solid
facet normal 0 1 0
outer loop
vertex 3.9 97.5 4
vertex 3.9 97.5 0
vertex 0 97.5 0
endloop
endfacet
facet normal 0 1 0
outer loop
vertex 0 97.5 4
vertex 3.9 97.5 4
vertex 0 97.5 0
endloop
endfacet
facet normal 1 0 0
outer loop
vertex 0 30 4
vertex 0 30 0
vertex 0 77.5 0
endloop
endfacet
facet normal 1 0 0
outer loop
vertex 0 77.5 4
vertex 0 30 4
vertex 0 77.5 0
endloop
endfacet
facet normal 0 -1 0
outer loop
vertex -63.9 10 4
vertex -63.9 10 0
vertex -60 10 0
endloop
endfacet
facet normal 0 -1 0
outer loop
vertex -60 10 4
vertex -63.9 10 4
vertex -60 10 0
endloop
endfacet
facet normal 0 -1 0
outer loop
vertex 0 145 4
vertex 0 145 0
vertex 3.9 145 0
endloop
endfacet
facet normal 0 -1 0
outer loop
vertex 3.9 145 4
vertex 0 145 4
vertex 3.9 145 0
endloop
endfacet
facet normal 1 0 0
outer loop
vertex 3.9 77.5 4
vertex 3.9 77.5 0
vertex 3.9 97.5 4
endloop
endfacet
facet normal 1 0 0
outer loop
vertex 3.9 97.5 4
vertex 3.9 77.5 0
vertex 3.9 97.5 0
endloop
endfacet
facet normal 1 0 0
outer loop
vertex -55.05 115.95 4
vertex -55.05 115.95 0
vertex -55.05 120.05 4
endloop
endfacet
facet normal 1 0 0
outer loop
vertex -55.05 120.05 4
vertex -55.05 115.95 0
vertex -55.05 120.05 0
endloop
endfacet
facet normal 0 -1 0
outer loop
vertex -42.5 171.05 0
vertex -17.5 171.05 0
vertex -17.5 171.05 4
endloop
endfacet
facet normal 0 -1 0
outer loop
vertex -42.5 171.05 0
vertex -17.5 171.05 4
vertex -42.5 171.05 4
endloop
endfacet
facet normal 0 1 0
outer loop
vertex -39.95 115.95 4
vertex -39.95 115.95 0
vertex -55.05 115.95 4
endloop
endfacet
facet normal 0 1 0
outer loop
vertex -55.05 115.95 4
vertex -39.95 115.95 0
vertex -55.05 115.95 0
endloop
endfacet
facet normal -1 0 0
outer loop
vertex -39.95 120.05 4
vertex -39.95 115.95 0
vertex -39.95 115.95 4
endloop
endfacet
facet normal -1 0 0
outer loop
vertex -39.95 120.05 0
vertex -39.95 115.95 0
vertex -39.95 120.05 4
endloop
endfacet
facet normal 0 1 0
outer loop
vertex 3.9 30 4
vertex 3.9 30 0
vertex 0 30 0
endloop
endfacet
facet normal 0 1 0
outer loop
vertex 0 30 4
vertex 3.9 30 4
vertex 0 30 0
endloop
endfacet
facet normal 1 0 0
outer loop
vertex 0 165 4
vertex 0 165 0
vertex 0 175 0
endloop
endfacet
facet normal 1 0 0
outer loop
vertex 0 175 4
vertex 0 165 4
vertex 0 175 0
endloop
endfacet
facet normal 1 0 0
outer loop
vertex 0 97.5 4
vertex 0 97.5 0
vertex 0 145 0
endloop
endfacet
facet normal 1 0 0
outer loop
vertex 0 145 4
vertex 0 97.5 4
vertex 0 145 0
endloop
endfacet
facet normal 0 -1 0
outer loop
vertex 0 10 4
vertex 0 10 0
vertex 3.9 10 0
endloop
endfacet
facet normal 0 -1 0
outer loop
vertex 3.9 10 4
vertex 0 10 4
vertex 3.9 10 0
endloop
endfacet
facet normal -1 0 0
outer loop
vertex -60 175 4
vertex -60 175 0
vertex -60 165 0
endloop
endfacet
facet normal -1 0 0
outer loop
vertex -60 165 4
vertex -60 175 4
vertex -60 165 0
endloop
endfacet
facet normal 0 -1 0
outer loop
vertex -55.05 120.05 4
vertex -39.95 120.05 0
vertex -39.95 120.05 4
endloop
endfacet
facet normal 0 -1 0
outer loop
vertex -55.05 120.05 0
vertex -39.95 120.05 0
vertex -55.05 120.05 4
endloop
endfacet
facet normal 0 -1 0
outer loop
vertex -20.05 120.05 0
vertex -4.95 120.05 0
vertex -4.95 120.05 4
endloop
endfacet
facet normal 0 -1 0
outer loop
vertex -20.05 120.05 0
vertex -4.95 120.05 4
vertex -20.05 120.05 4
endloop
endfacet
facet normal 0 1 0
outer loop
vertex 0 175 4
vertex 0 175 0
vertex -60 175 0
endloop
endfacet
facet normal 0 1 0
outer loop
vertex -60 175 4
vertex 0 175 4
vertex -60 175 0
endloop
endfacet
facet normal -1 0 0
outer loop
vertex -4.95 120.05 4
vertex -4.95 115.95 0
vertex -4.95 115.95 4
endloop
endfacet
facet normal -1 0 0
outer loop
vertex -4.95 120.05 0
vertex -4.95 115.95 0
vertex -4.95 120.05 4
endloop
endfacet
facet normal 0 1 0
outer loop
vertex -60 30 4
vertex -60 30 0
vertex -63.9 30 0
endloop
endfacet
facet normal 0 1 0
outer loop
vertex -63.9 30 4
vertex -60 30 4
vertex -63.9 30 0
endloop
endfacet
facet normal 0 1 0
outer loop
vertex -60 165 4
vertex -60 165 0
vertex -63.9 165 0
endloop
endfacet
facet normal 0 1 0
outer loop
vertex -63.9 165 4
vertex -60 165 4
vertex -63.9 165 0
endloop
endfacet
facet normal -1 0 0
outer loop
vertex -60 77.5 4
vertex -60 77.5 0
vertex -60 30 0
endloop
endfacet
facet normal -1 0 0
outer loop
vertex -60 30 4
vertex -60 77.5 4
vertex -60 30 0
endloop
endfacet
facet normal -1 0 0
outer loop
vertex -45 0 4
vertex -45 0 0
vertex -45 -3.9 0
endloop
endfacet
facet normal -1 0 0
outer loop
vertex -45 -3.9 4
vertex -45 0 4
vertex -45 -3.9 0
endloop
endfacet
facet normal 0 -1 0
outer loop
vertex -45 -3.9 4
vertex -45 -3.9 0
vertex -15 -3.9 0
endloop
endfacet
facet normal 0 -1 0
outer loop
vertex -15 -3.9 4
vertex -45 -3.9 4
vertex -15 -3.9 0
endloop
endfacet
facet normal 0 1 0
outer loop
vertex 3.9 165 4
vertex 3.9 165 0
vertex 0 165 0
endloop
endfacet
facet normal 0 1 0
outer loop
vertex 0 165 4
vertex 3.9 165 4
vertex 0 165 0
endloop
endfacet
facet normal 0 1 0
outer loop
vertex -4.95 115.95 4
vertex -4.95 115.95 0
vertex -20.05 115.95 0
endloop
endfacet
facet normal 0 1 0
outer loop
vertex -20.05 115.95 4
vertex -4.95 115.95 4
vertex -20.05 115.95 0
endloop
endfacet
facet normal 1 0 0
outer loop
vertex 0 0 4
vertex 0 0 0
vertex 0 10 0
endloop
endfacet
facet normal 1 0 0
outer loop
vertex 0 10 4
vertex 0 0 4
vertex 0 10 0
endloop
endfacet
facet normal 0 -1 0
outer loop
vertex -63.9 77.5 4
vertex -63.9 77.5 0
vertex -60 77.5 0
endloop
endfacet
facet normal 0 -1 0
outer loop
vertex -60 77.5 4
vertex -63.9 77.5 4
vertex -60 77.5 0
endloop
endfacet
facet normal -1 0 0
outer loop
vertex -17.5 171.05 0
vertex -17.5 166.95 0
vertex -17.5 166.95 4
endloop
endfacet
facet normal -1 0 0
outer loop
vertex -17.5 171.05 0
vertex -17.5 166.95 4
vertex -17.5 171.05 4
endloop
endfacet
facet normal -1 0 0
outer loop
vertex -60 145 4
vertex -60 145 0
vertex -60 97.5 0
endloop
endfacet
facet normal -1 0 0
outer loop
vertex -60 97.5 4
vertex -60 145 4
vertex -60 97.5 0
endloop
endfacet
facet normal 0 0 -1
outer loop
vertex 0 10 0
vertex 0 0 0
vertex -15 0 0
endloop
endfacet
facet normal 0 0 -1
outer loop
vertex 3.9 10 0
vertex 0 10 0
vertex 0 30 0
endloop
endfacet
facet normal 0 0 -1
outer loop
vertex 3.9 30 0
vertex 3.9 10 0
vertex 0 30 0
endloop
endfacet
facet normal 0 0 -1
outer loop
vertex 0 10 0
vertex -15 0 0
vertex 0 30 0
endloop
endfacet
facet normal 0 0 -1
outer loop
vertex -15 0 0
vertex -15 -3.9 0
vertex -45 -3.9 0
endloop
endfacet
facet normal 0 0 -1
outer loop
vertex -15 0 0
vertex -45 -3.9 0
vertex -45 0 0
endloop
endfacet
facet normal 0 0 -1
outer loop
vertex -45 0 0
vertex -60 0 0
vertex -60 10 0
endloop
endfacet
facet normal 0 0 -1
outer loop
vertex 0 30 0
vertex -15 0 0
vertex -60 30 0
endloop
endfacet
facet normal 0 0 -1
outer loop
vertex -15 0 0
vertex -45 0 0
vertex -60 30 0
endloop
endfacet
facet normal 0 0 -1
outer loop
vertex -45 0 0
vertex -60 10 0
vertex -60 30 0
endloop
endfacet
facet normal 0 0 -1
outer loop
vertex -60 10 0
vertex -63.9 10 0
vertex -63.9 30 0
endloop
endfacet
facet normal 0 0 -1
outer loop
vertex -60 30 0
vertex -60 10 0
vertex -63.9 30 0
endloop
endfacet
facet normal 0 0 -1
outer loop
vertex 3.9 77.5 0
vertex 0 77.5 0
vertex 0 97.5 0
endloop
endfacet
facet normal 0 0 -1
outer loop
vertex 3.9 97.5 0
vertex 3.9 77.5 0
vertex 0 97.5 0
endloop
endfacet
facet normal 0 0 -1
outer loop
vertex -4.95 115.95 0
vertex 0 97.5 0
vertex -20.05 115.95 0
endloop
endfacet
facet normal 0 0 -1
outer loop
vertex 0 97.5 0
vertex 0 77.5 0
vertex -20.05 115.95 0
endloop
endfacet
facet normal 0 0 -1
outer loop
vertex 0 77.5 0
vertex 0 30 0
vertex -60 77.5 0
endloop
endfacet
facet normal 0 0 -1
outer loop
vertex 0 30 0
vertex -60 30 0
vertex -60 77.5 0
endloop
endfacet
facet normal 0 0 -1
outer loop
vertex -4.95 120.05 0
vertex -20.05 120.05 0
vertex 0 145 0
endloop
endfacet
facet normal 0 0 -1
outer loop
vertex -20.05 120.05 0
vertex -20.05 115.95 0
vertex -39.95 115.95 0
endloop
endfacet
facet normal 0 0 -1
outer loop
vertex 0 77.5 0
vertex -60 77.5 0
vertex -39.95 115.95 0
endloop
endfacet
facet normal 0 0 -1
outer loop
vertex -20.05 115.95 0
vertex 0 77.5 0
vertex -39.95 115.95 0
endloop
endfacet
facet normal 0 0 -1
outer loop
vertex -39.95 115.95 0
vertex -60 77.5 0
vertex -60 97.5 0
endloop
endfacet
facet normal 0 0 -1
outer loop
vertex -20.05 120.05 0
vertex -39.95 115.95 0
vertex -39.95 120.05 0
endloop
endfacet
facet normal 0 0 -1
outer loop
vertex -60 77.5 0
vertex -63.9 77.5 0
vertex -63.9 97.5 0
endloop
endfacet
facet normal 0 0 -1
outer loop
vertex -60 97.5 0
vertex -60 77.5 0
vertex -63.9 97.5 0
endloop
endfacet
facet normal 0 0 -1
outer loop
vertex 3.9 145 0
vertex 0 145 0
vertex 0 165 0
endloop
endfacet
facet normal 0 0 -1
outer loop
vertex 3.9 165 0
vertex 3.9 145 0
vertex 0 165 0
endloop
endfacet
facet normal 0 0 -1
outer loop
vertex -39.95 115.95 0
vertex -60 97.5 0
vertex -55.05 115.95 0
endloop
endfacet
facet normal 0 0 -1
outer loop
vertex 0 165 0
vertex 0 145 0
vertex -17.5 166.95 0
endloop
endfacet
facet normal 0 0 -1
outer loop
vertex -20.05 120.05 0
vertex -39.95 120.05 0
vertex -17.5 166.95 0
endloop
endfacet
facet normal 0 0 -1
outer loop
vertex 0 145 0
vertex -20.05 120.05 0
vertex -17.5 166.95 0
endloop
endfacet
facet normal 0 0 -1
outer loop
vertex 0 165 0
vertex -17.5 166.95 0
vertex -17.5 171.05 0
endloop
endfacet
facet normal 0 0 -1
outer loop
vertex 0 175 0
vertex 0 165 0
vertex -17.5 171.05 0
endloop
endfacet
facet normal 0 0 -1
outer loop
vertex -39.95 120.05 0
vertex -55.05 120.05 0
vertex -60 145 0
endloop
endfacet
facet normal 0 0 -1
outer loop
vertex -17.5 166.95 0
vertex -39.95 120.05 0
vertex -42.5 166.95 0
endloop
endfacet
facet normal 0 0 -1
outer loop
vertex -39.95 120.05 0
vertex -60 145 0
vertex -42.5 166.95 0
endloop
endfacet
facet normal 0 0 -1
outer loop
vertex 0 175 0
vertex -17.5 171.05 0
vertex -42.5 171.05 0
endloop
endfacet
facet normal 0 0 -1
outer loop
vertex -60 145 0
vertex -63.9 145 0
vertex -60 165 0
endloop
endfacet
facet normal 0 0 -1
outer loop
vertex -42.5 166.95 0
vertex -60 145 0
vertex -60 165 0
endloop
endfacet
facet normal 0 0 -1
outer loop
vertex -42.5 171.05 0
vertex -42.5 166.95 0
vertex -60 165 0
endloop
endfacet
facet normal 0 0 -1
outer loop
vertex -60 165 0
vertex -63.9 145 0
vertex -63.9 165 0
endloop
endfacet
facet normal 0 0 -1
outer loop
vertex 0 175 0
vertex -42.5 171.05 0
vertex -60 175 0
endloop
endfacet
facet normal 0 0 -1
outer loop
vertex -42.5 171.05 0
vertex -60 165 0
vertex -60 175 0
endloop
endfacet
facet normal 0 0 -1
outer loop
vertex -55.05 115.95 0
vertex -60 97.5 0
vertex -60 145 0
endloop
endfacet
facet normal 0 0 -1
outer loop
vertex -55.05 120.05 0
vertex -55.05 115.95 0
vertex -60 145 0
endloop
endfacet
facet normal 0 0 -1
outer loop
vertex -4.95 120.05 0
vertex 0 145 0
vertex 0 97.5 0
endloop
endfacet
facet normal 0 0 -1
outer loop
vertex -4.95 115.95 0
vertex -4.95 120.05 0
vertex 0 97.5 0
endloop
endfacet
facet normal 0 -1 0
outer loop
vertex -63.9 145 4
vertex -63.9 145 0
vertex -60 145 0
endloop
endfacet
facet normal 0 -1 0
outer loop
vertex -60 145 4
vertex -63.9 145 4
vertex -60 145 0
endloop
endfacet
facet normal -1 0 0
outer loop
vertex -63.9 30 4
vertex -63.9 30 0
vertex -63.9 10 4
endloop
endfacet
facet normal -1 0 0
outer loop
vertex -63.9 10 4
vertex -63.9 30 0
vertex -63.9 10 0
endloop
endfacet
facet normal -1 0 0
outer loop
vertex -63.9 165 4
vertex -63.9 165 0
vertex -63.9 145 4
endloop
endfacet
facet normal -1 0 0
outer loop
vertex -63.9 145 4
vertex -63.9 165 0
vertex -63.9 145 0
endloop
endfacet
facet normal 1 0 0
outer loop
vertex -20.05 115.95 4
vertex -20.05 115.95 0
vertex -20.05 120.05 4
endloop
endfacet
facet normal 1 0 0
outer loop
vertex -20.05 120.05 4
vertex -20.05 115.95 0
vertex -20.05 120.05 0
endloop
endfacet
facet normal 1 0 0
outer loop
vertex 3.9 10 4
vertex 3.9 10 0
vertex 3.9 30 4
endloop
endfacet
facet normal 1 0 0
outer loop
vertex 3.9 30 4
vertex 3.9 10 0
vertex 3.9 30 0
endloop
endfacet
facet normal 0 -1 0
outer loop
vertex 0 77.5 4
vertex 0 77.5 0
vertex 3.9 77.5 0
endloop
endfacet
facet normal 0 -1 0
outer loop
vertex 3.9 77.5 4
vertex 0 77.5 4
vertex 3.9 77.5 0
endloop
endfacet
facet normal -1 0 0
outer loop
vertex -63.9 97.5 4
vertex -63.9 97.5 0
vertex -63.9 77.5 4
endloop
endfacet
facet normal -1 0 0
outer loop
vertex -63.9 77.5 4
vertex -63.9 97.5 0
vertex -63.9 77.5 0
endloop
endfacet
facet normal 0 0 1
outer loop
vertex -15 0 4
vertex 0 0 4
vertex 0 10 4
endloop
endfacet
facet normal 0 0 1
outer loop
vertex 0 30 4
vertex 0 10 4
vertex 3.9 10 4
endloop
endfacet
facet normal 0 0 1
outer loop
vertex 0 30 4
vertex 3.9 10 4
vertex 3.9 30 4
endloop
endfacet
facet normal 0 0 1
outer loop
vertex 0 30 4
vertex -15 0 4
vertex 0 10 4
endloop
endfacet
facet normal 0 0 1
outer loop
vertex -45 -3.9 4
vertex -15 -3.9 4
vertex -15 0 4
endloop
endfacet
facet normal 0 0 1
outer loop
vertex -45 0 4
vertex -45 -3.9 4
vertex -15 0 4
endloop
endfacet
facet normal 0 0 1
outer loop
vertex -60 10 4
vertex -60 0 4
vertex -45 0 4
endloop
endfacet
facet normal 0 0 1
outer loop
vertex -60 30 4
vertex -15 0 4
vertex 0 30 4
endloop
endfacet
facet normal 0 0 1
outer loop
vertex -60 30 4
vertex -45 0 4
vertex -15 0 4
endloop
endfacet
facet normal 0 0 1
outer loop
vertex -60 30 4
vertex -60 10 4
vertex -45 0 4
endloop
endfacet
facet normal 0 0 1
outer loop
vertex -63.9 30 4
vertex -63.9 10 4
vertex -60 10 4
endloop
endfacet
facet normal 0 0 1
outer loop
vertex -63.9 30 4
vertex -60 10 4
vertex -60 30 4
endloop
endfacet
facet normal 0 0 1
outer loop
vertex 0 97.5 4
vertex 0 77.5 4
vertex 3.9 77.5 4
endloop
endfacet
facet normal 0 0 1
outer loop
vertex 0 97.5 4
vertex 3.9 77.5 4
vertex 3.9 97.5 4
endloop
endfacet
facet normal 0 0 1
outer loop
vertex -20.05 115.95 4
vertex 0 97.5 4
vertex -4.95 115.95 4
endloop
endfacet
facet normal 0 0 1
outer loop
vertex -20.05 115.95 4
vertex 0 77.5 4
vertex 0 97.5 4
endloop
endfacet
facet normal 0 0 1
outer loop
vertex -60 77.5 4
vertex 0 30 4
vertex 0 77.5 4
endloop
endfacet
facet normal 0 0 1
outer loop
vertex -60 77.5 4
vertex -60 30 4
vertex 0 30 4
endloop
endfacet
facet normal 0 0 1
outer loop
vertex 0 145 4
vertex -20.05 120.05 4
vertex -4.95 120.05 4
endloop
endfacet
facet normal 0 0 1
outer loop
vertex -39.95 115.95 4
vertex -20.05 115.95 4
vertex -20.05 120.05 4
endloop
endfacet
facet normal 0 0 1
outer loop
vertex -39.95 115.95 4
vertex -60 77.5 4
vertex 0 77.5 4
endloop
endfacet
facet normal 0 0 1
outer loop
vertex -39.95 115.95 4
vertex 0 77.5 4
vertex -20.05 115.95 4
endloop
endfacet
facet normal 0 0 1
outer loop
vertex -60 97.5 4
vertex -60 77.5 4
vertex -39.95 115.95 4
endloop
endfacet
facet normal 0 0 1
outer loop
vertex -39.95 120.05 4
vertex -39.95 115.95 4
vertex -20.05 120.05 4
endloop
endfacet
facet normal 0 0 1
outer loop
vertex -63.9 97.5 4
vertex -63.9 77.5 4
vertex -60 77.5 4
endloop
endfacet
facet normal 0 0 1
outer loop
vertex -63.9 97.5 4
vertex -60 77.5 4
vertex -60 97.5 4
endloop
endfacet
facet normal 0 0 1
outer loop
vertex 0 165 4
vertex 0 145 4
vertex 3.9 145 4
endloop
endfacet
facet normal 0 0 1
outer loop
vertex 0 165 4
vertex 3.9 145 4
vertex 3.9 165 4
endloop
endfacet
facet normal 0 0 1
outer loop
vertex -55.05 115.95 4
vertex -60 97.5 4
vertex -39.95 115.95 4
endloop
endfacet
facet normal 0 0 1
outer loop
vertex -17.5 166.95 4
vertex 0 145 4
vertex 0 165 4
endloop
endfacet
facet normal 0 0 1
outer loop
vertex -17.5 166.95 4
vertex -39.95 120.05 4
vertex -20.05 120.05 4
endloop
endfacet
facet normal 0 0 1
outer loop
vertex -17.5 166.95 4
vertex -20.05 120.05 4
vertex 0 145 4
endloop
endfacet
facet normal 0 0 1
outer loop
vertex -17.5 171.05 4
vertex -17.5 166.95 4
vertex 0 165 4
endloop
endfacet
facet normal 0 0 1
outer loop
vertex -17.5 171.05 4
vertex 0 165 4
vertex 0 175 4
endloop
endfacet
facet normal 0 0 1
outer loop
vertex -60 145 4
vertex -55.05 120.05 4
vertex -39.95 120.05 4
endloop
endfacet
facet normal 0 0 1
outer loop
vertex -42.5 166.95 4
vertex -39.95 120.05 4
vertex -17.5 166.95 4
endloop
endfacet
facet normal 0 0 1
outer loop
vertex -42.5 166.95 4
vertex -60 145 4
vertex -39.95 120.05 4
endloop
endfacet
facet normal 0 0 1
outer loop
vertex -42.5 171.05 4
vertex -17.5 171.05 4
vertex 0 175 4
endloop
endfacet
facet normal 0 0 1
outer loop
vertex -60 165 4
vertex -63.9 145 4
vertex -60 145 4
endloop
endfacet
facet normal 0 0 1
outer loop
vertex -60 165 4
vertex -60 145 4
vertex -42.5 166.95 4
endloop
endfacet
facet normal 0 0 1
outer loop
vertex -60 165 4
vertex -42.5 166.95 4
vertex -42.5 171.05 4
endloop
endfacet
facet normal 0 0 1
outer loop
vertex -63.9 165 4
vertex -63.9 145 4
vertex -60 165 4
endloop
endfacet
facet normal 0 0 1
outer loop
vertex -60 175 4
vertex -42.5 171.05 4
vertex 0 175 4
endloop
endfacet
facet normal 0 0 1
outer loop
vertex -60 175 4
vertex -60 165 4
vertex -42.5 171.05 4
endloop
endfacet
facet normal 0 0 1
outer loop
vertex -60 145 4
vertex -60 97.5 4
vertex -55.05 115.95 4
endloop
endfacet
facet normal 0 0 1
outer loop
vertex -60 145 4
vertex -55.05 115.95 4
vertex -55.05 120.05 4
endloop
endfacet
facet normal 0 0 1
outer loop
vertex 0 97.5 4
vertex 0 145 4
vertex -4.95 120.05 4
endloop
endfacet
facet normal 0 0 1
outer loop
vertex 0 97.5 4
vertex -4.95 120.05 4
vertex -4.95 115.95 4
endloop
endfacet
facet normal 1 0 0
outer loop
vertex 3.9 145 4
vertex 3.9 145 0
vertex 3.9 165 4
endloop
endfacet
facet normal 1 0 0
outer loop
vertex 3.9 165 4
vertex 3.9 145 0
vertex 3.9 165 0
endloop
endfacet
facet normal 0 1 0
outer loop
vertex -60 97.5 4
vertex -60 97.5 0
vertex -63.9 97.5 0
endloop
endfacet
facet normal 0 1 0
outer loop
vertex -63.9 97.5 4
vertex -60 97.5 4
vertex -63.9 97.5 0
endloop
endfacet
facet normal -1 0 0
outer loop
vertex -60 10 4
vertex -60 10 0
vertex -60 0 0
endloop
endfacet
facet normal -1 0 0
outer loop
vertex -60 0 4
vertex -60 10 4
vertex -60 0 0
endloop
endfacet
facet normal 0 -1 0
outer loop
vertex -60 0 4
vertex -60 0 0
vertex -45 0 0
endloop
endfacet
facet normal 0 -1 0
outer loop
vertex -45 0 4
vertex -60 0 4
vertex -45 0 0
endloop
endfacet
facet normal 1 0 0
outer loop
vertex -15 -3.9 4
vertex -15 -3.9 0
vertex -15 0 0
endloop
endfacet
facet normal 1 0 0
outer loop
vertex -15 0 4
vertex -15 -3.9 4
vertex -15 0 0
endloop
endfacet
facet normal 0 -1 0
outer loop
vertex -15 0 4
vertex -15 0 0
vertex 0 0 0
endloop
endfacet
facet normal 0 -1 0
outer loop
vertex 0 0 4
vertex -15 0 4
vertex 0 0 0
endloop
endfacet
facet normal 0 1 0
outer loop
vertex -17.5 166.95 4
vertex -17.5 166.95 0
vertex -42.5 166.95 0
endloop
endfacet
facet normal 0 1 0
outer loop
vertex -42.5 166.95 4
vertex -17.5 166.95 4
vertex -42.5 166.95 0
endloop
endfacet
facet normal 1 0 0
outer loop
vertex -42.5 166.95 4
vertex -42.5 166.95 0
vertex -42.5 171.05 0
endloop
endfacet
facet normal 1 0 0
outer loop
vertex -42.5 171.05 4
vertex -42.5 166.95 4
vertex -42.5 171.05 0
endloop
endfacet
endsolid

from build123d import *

# Parameters (mm, degrees)
SKETCH_1_W      = 4.1
SKETCH_1_H      = 15.1
SKETCH_1_H_2    = 25
EXTRUDE_1_DEPTH = 4


with BuildPart() as part:
    # ｽｹｯﾁ1 → ﾎﾞｽ - 押し出し1 (new body)
    with BuildSketch(Plane(origin=(0, 0, 0), x_dir=(0, 1, 0), z_dir=(0, 0, 1))):
        Polygon((165, 60), (165, 63.9), (145, 63.9), (145, 60), (97.5, 60), (97.5, 63.9), (77.5, 63.9), (77.5, 60), (30, 60), (30, 63.9), (10, 63.9), (10, 60), (0, 60), (0, 45), (-3.9, 45), (-3.9, 15), (0, 15), (0, 0), (10, 0), (10, -3.9), (30, -3.9), (30, 0), (77.5, 0), (77.5, -3.9), (97.5, -3.9), (97.5, 0), (145, 0), (145, -3.9), (165, -3.9), (165, 0), (175, 0), (175, 60), align=None)
        with Locations((118, 47.5)):
            Rectangle(SKETCH_1_W, SKETCH_1_H, mode=Mode.SUBTRACT)
        with Locations((118, 12.5)):
            Rectangle(SKETCH_1_W, SKETCH_1_H, mode=Mode.SUBTRACT)
        with Locations((169, 30)):
            Rectangle(SKETCH_1_W, SKETCH_1_H_2, mode=Mode.SUBTRACT)
    extrude(amount=EXTRUDE_1_DEPTH)


solid = part.part
